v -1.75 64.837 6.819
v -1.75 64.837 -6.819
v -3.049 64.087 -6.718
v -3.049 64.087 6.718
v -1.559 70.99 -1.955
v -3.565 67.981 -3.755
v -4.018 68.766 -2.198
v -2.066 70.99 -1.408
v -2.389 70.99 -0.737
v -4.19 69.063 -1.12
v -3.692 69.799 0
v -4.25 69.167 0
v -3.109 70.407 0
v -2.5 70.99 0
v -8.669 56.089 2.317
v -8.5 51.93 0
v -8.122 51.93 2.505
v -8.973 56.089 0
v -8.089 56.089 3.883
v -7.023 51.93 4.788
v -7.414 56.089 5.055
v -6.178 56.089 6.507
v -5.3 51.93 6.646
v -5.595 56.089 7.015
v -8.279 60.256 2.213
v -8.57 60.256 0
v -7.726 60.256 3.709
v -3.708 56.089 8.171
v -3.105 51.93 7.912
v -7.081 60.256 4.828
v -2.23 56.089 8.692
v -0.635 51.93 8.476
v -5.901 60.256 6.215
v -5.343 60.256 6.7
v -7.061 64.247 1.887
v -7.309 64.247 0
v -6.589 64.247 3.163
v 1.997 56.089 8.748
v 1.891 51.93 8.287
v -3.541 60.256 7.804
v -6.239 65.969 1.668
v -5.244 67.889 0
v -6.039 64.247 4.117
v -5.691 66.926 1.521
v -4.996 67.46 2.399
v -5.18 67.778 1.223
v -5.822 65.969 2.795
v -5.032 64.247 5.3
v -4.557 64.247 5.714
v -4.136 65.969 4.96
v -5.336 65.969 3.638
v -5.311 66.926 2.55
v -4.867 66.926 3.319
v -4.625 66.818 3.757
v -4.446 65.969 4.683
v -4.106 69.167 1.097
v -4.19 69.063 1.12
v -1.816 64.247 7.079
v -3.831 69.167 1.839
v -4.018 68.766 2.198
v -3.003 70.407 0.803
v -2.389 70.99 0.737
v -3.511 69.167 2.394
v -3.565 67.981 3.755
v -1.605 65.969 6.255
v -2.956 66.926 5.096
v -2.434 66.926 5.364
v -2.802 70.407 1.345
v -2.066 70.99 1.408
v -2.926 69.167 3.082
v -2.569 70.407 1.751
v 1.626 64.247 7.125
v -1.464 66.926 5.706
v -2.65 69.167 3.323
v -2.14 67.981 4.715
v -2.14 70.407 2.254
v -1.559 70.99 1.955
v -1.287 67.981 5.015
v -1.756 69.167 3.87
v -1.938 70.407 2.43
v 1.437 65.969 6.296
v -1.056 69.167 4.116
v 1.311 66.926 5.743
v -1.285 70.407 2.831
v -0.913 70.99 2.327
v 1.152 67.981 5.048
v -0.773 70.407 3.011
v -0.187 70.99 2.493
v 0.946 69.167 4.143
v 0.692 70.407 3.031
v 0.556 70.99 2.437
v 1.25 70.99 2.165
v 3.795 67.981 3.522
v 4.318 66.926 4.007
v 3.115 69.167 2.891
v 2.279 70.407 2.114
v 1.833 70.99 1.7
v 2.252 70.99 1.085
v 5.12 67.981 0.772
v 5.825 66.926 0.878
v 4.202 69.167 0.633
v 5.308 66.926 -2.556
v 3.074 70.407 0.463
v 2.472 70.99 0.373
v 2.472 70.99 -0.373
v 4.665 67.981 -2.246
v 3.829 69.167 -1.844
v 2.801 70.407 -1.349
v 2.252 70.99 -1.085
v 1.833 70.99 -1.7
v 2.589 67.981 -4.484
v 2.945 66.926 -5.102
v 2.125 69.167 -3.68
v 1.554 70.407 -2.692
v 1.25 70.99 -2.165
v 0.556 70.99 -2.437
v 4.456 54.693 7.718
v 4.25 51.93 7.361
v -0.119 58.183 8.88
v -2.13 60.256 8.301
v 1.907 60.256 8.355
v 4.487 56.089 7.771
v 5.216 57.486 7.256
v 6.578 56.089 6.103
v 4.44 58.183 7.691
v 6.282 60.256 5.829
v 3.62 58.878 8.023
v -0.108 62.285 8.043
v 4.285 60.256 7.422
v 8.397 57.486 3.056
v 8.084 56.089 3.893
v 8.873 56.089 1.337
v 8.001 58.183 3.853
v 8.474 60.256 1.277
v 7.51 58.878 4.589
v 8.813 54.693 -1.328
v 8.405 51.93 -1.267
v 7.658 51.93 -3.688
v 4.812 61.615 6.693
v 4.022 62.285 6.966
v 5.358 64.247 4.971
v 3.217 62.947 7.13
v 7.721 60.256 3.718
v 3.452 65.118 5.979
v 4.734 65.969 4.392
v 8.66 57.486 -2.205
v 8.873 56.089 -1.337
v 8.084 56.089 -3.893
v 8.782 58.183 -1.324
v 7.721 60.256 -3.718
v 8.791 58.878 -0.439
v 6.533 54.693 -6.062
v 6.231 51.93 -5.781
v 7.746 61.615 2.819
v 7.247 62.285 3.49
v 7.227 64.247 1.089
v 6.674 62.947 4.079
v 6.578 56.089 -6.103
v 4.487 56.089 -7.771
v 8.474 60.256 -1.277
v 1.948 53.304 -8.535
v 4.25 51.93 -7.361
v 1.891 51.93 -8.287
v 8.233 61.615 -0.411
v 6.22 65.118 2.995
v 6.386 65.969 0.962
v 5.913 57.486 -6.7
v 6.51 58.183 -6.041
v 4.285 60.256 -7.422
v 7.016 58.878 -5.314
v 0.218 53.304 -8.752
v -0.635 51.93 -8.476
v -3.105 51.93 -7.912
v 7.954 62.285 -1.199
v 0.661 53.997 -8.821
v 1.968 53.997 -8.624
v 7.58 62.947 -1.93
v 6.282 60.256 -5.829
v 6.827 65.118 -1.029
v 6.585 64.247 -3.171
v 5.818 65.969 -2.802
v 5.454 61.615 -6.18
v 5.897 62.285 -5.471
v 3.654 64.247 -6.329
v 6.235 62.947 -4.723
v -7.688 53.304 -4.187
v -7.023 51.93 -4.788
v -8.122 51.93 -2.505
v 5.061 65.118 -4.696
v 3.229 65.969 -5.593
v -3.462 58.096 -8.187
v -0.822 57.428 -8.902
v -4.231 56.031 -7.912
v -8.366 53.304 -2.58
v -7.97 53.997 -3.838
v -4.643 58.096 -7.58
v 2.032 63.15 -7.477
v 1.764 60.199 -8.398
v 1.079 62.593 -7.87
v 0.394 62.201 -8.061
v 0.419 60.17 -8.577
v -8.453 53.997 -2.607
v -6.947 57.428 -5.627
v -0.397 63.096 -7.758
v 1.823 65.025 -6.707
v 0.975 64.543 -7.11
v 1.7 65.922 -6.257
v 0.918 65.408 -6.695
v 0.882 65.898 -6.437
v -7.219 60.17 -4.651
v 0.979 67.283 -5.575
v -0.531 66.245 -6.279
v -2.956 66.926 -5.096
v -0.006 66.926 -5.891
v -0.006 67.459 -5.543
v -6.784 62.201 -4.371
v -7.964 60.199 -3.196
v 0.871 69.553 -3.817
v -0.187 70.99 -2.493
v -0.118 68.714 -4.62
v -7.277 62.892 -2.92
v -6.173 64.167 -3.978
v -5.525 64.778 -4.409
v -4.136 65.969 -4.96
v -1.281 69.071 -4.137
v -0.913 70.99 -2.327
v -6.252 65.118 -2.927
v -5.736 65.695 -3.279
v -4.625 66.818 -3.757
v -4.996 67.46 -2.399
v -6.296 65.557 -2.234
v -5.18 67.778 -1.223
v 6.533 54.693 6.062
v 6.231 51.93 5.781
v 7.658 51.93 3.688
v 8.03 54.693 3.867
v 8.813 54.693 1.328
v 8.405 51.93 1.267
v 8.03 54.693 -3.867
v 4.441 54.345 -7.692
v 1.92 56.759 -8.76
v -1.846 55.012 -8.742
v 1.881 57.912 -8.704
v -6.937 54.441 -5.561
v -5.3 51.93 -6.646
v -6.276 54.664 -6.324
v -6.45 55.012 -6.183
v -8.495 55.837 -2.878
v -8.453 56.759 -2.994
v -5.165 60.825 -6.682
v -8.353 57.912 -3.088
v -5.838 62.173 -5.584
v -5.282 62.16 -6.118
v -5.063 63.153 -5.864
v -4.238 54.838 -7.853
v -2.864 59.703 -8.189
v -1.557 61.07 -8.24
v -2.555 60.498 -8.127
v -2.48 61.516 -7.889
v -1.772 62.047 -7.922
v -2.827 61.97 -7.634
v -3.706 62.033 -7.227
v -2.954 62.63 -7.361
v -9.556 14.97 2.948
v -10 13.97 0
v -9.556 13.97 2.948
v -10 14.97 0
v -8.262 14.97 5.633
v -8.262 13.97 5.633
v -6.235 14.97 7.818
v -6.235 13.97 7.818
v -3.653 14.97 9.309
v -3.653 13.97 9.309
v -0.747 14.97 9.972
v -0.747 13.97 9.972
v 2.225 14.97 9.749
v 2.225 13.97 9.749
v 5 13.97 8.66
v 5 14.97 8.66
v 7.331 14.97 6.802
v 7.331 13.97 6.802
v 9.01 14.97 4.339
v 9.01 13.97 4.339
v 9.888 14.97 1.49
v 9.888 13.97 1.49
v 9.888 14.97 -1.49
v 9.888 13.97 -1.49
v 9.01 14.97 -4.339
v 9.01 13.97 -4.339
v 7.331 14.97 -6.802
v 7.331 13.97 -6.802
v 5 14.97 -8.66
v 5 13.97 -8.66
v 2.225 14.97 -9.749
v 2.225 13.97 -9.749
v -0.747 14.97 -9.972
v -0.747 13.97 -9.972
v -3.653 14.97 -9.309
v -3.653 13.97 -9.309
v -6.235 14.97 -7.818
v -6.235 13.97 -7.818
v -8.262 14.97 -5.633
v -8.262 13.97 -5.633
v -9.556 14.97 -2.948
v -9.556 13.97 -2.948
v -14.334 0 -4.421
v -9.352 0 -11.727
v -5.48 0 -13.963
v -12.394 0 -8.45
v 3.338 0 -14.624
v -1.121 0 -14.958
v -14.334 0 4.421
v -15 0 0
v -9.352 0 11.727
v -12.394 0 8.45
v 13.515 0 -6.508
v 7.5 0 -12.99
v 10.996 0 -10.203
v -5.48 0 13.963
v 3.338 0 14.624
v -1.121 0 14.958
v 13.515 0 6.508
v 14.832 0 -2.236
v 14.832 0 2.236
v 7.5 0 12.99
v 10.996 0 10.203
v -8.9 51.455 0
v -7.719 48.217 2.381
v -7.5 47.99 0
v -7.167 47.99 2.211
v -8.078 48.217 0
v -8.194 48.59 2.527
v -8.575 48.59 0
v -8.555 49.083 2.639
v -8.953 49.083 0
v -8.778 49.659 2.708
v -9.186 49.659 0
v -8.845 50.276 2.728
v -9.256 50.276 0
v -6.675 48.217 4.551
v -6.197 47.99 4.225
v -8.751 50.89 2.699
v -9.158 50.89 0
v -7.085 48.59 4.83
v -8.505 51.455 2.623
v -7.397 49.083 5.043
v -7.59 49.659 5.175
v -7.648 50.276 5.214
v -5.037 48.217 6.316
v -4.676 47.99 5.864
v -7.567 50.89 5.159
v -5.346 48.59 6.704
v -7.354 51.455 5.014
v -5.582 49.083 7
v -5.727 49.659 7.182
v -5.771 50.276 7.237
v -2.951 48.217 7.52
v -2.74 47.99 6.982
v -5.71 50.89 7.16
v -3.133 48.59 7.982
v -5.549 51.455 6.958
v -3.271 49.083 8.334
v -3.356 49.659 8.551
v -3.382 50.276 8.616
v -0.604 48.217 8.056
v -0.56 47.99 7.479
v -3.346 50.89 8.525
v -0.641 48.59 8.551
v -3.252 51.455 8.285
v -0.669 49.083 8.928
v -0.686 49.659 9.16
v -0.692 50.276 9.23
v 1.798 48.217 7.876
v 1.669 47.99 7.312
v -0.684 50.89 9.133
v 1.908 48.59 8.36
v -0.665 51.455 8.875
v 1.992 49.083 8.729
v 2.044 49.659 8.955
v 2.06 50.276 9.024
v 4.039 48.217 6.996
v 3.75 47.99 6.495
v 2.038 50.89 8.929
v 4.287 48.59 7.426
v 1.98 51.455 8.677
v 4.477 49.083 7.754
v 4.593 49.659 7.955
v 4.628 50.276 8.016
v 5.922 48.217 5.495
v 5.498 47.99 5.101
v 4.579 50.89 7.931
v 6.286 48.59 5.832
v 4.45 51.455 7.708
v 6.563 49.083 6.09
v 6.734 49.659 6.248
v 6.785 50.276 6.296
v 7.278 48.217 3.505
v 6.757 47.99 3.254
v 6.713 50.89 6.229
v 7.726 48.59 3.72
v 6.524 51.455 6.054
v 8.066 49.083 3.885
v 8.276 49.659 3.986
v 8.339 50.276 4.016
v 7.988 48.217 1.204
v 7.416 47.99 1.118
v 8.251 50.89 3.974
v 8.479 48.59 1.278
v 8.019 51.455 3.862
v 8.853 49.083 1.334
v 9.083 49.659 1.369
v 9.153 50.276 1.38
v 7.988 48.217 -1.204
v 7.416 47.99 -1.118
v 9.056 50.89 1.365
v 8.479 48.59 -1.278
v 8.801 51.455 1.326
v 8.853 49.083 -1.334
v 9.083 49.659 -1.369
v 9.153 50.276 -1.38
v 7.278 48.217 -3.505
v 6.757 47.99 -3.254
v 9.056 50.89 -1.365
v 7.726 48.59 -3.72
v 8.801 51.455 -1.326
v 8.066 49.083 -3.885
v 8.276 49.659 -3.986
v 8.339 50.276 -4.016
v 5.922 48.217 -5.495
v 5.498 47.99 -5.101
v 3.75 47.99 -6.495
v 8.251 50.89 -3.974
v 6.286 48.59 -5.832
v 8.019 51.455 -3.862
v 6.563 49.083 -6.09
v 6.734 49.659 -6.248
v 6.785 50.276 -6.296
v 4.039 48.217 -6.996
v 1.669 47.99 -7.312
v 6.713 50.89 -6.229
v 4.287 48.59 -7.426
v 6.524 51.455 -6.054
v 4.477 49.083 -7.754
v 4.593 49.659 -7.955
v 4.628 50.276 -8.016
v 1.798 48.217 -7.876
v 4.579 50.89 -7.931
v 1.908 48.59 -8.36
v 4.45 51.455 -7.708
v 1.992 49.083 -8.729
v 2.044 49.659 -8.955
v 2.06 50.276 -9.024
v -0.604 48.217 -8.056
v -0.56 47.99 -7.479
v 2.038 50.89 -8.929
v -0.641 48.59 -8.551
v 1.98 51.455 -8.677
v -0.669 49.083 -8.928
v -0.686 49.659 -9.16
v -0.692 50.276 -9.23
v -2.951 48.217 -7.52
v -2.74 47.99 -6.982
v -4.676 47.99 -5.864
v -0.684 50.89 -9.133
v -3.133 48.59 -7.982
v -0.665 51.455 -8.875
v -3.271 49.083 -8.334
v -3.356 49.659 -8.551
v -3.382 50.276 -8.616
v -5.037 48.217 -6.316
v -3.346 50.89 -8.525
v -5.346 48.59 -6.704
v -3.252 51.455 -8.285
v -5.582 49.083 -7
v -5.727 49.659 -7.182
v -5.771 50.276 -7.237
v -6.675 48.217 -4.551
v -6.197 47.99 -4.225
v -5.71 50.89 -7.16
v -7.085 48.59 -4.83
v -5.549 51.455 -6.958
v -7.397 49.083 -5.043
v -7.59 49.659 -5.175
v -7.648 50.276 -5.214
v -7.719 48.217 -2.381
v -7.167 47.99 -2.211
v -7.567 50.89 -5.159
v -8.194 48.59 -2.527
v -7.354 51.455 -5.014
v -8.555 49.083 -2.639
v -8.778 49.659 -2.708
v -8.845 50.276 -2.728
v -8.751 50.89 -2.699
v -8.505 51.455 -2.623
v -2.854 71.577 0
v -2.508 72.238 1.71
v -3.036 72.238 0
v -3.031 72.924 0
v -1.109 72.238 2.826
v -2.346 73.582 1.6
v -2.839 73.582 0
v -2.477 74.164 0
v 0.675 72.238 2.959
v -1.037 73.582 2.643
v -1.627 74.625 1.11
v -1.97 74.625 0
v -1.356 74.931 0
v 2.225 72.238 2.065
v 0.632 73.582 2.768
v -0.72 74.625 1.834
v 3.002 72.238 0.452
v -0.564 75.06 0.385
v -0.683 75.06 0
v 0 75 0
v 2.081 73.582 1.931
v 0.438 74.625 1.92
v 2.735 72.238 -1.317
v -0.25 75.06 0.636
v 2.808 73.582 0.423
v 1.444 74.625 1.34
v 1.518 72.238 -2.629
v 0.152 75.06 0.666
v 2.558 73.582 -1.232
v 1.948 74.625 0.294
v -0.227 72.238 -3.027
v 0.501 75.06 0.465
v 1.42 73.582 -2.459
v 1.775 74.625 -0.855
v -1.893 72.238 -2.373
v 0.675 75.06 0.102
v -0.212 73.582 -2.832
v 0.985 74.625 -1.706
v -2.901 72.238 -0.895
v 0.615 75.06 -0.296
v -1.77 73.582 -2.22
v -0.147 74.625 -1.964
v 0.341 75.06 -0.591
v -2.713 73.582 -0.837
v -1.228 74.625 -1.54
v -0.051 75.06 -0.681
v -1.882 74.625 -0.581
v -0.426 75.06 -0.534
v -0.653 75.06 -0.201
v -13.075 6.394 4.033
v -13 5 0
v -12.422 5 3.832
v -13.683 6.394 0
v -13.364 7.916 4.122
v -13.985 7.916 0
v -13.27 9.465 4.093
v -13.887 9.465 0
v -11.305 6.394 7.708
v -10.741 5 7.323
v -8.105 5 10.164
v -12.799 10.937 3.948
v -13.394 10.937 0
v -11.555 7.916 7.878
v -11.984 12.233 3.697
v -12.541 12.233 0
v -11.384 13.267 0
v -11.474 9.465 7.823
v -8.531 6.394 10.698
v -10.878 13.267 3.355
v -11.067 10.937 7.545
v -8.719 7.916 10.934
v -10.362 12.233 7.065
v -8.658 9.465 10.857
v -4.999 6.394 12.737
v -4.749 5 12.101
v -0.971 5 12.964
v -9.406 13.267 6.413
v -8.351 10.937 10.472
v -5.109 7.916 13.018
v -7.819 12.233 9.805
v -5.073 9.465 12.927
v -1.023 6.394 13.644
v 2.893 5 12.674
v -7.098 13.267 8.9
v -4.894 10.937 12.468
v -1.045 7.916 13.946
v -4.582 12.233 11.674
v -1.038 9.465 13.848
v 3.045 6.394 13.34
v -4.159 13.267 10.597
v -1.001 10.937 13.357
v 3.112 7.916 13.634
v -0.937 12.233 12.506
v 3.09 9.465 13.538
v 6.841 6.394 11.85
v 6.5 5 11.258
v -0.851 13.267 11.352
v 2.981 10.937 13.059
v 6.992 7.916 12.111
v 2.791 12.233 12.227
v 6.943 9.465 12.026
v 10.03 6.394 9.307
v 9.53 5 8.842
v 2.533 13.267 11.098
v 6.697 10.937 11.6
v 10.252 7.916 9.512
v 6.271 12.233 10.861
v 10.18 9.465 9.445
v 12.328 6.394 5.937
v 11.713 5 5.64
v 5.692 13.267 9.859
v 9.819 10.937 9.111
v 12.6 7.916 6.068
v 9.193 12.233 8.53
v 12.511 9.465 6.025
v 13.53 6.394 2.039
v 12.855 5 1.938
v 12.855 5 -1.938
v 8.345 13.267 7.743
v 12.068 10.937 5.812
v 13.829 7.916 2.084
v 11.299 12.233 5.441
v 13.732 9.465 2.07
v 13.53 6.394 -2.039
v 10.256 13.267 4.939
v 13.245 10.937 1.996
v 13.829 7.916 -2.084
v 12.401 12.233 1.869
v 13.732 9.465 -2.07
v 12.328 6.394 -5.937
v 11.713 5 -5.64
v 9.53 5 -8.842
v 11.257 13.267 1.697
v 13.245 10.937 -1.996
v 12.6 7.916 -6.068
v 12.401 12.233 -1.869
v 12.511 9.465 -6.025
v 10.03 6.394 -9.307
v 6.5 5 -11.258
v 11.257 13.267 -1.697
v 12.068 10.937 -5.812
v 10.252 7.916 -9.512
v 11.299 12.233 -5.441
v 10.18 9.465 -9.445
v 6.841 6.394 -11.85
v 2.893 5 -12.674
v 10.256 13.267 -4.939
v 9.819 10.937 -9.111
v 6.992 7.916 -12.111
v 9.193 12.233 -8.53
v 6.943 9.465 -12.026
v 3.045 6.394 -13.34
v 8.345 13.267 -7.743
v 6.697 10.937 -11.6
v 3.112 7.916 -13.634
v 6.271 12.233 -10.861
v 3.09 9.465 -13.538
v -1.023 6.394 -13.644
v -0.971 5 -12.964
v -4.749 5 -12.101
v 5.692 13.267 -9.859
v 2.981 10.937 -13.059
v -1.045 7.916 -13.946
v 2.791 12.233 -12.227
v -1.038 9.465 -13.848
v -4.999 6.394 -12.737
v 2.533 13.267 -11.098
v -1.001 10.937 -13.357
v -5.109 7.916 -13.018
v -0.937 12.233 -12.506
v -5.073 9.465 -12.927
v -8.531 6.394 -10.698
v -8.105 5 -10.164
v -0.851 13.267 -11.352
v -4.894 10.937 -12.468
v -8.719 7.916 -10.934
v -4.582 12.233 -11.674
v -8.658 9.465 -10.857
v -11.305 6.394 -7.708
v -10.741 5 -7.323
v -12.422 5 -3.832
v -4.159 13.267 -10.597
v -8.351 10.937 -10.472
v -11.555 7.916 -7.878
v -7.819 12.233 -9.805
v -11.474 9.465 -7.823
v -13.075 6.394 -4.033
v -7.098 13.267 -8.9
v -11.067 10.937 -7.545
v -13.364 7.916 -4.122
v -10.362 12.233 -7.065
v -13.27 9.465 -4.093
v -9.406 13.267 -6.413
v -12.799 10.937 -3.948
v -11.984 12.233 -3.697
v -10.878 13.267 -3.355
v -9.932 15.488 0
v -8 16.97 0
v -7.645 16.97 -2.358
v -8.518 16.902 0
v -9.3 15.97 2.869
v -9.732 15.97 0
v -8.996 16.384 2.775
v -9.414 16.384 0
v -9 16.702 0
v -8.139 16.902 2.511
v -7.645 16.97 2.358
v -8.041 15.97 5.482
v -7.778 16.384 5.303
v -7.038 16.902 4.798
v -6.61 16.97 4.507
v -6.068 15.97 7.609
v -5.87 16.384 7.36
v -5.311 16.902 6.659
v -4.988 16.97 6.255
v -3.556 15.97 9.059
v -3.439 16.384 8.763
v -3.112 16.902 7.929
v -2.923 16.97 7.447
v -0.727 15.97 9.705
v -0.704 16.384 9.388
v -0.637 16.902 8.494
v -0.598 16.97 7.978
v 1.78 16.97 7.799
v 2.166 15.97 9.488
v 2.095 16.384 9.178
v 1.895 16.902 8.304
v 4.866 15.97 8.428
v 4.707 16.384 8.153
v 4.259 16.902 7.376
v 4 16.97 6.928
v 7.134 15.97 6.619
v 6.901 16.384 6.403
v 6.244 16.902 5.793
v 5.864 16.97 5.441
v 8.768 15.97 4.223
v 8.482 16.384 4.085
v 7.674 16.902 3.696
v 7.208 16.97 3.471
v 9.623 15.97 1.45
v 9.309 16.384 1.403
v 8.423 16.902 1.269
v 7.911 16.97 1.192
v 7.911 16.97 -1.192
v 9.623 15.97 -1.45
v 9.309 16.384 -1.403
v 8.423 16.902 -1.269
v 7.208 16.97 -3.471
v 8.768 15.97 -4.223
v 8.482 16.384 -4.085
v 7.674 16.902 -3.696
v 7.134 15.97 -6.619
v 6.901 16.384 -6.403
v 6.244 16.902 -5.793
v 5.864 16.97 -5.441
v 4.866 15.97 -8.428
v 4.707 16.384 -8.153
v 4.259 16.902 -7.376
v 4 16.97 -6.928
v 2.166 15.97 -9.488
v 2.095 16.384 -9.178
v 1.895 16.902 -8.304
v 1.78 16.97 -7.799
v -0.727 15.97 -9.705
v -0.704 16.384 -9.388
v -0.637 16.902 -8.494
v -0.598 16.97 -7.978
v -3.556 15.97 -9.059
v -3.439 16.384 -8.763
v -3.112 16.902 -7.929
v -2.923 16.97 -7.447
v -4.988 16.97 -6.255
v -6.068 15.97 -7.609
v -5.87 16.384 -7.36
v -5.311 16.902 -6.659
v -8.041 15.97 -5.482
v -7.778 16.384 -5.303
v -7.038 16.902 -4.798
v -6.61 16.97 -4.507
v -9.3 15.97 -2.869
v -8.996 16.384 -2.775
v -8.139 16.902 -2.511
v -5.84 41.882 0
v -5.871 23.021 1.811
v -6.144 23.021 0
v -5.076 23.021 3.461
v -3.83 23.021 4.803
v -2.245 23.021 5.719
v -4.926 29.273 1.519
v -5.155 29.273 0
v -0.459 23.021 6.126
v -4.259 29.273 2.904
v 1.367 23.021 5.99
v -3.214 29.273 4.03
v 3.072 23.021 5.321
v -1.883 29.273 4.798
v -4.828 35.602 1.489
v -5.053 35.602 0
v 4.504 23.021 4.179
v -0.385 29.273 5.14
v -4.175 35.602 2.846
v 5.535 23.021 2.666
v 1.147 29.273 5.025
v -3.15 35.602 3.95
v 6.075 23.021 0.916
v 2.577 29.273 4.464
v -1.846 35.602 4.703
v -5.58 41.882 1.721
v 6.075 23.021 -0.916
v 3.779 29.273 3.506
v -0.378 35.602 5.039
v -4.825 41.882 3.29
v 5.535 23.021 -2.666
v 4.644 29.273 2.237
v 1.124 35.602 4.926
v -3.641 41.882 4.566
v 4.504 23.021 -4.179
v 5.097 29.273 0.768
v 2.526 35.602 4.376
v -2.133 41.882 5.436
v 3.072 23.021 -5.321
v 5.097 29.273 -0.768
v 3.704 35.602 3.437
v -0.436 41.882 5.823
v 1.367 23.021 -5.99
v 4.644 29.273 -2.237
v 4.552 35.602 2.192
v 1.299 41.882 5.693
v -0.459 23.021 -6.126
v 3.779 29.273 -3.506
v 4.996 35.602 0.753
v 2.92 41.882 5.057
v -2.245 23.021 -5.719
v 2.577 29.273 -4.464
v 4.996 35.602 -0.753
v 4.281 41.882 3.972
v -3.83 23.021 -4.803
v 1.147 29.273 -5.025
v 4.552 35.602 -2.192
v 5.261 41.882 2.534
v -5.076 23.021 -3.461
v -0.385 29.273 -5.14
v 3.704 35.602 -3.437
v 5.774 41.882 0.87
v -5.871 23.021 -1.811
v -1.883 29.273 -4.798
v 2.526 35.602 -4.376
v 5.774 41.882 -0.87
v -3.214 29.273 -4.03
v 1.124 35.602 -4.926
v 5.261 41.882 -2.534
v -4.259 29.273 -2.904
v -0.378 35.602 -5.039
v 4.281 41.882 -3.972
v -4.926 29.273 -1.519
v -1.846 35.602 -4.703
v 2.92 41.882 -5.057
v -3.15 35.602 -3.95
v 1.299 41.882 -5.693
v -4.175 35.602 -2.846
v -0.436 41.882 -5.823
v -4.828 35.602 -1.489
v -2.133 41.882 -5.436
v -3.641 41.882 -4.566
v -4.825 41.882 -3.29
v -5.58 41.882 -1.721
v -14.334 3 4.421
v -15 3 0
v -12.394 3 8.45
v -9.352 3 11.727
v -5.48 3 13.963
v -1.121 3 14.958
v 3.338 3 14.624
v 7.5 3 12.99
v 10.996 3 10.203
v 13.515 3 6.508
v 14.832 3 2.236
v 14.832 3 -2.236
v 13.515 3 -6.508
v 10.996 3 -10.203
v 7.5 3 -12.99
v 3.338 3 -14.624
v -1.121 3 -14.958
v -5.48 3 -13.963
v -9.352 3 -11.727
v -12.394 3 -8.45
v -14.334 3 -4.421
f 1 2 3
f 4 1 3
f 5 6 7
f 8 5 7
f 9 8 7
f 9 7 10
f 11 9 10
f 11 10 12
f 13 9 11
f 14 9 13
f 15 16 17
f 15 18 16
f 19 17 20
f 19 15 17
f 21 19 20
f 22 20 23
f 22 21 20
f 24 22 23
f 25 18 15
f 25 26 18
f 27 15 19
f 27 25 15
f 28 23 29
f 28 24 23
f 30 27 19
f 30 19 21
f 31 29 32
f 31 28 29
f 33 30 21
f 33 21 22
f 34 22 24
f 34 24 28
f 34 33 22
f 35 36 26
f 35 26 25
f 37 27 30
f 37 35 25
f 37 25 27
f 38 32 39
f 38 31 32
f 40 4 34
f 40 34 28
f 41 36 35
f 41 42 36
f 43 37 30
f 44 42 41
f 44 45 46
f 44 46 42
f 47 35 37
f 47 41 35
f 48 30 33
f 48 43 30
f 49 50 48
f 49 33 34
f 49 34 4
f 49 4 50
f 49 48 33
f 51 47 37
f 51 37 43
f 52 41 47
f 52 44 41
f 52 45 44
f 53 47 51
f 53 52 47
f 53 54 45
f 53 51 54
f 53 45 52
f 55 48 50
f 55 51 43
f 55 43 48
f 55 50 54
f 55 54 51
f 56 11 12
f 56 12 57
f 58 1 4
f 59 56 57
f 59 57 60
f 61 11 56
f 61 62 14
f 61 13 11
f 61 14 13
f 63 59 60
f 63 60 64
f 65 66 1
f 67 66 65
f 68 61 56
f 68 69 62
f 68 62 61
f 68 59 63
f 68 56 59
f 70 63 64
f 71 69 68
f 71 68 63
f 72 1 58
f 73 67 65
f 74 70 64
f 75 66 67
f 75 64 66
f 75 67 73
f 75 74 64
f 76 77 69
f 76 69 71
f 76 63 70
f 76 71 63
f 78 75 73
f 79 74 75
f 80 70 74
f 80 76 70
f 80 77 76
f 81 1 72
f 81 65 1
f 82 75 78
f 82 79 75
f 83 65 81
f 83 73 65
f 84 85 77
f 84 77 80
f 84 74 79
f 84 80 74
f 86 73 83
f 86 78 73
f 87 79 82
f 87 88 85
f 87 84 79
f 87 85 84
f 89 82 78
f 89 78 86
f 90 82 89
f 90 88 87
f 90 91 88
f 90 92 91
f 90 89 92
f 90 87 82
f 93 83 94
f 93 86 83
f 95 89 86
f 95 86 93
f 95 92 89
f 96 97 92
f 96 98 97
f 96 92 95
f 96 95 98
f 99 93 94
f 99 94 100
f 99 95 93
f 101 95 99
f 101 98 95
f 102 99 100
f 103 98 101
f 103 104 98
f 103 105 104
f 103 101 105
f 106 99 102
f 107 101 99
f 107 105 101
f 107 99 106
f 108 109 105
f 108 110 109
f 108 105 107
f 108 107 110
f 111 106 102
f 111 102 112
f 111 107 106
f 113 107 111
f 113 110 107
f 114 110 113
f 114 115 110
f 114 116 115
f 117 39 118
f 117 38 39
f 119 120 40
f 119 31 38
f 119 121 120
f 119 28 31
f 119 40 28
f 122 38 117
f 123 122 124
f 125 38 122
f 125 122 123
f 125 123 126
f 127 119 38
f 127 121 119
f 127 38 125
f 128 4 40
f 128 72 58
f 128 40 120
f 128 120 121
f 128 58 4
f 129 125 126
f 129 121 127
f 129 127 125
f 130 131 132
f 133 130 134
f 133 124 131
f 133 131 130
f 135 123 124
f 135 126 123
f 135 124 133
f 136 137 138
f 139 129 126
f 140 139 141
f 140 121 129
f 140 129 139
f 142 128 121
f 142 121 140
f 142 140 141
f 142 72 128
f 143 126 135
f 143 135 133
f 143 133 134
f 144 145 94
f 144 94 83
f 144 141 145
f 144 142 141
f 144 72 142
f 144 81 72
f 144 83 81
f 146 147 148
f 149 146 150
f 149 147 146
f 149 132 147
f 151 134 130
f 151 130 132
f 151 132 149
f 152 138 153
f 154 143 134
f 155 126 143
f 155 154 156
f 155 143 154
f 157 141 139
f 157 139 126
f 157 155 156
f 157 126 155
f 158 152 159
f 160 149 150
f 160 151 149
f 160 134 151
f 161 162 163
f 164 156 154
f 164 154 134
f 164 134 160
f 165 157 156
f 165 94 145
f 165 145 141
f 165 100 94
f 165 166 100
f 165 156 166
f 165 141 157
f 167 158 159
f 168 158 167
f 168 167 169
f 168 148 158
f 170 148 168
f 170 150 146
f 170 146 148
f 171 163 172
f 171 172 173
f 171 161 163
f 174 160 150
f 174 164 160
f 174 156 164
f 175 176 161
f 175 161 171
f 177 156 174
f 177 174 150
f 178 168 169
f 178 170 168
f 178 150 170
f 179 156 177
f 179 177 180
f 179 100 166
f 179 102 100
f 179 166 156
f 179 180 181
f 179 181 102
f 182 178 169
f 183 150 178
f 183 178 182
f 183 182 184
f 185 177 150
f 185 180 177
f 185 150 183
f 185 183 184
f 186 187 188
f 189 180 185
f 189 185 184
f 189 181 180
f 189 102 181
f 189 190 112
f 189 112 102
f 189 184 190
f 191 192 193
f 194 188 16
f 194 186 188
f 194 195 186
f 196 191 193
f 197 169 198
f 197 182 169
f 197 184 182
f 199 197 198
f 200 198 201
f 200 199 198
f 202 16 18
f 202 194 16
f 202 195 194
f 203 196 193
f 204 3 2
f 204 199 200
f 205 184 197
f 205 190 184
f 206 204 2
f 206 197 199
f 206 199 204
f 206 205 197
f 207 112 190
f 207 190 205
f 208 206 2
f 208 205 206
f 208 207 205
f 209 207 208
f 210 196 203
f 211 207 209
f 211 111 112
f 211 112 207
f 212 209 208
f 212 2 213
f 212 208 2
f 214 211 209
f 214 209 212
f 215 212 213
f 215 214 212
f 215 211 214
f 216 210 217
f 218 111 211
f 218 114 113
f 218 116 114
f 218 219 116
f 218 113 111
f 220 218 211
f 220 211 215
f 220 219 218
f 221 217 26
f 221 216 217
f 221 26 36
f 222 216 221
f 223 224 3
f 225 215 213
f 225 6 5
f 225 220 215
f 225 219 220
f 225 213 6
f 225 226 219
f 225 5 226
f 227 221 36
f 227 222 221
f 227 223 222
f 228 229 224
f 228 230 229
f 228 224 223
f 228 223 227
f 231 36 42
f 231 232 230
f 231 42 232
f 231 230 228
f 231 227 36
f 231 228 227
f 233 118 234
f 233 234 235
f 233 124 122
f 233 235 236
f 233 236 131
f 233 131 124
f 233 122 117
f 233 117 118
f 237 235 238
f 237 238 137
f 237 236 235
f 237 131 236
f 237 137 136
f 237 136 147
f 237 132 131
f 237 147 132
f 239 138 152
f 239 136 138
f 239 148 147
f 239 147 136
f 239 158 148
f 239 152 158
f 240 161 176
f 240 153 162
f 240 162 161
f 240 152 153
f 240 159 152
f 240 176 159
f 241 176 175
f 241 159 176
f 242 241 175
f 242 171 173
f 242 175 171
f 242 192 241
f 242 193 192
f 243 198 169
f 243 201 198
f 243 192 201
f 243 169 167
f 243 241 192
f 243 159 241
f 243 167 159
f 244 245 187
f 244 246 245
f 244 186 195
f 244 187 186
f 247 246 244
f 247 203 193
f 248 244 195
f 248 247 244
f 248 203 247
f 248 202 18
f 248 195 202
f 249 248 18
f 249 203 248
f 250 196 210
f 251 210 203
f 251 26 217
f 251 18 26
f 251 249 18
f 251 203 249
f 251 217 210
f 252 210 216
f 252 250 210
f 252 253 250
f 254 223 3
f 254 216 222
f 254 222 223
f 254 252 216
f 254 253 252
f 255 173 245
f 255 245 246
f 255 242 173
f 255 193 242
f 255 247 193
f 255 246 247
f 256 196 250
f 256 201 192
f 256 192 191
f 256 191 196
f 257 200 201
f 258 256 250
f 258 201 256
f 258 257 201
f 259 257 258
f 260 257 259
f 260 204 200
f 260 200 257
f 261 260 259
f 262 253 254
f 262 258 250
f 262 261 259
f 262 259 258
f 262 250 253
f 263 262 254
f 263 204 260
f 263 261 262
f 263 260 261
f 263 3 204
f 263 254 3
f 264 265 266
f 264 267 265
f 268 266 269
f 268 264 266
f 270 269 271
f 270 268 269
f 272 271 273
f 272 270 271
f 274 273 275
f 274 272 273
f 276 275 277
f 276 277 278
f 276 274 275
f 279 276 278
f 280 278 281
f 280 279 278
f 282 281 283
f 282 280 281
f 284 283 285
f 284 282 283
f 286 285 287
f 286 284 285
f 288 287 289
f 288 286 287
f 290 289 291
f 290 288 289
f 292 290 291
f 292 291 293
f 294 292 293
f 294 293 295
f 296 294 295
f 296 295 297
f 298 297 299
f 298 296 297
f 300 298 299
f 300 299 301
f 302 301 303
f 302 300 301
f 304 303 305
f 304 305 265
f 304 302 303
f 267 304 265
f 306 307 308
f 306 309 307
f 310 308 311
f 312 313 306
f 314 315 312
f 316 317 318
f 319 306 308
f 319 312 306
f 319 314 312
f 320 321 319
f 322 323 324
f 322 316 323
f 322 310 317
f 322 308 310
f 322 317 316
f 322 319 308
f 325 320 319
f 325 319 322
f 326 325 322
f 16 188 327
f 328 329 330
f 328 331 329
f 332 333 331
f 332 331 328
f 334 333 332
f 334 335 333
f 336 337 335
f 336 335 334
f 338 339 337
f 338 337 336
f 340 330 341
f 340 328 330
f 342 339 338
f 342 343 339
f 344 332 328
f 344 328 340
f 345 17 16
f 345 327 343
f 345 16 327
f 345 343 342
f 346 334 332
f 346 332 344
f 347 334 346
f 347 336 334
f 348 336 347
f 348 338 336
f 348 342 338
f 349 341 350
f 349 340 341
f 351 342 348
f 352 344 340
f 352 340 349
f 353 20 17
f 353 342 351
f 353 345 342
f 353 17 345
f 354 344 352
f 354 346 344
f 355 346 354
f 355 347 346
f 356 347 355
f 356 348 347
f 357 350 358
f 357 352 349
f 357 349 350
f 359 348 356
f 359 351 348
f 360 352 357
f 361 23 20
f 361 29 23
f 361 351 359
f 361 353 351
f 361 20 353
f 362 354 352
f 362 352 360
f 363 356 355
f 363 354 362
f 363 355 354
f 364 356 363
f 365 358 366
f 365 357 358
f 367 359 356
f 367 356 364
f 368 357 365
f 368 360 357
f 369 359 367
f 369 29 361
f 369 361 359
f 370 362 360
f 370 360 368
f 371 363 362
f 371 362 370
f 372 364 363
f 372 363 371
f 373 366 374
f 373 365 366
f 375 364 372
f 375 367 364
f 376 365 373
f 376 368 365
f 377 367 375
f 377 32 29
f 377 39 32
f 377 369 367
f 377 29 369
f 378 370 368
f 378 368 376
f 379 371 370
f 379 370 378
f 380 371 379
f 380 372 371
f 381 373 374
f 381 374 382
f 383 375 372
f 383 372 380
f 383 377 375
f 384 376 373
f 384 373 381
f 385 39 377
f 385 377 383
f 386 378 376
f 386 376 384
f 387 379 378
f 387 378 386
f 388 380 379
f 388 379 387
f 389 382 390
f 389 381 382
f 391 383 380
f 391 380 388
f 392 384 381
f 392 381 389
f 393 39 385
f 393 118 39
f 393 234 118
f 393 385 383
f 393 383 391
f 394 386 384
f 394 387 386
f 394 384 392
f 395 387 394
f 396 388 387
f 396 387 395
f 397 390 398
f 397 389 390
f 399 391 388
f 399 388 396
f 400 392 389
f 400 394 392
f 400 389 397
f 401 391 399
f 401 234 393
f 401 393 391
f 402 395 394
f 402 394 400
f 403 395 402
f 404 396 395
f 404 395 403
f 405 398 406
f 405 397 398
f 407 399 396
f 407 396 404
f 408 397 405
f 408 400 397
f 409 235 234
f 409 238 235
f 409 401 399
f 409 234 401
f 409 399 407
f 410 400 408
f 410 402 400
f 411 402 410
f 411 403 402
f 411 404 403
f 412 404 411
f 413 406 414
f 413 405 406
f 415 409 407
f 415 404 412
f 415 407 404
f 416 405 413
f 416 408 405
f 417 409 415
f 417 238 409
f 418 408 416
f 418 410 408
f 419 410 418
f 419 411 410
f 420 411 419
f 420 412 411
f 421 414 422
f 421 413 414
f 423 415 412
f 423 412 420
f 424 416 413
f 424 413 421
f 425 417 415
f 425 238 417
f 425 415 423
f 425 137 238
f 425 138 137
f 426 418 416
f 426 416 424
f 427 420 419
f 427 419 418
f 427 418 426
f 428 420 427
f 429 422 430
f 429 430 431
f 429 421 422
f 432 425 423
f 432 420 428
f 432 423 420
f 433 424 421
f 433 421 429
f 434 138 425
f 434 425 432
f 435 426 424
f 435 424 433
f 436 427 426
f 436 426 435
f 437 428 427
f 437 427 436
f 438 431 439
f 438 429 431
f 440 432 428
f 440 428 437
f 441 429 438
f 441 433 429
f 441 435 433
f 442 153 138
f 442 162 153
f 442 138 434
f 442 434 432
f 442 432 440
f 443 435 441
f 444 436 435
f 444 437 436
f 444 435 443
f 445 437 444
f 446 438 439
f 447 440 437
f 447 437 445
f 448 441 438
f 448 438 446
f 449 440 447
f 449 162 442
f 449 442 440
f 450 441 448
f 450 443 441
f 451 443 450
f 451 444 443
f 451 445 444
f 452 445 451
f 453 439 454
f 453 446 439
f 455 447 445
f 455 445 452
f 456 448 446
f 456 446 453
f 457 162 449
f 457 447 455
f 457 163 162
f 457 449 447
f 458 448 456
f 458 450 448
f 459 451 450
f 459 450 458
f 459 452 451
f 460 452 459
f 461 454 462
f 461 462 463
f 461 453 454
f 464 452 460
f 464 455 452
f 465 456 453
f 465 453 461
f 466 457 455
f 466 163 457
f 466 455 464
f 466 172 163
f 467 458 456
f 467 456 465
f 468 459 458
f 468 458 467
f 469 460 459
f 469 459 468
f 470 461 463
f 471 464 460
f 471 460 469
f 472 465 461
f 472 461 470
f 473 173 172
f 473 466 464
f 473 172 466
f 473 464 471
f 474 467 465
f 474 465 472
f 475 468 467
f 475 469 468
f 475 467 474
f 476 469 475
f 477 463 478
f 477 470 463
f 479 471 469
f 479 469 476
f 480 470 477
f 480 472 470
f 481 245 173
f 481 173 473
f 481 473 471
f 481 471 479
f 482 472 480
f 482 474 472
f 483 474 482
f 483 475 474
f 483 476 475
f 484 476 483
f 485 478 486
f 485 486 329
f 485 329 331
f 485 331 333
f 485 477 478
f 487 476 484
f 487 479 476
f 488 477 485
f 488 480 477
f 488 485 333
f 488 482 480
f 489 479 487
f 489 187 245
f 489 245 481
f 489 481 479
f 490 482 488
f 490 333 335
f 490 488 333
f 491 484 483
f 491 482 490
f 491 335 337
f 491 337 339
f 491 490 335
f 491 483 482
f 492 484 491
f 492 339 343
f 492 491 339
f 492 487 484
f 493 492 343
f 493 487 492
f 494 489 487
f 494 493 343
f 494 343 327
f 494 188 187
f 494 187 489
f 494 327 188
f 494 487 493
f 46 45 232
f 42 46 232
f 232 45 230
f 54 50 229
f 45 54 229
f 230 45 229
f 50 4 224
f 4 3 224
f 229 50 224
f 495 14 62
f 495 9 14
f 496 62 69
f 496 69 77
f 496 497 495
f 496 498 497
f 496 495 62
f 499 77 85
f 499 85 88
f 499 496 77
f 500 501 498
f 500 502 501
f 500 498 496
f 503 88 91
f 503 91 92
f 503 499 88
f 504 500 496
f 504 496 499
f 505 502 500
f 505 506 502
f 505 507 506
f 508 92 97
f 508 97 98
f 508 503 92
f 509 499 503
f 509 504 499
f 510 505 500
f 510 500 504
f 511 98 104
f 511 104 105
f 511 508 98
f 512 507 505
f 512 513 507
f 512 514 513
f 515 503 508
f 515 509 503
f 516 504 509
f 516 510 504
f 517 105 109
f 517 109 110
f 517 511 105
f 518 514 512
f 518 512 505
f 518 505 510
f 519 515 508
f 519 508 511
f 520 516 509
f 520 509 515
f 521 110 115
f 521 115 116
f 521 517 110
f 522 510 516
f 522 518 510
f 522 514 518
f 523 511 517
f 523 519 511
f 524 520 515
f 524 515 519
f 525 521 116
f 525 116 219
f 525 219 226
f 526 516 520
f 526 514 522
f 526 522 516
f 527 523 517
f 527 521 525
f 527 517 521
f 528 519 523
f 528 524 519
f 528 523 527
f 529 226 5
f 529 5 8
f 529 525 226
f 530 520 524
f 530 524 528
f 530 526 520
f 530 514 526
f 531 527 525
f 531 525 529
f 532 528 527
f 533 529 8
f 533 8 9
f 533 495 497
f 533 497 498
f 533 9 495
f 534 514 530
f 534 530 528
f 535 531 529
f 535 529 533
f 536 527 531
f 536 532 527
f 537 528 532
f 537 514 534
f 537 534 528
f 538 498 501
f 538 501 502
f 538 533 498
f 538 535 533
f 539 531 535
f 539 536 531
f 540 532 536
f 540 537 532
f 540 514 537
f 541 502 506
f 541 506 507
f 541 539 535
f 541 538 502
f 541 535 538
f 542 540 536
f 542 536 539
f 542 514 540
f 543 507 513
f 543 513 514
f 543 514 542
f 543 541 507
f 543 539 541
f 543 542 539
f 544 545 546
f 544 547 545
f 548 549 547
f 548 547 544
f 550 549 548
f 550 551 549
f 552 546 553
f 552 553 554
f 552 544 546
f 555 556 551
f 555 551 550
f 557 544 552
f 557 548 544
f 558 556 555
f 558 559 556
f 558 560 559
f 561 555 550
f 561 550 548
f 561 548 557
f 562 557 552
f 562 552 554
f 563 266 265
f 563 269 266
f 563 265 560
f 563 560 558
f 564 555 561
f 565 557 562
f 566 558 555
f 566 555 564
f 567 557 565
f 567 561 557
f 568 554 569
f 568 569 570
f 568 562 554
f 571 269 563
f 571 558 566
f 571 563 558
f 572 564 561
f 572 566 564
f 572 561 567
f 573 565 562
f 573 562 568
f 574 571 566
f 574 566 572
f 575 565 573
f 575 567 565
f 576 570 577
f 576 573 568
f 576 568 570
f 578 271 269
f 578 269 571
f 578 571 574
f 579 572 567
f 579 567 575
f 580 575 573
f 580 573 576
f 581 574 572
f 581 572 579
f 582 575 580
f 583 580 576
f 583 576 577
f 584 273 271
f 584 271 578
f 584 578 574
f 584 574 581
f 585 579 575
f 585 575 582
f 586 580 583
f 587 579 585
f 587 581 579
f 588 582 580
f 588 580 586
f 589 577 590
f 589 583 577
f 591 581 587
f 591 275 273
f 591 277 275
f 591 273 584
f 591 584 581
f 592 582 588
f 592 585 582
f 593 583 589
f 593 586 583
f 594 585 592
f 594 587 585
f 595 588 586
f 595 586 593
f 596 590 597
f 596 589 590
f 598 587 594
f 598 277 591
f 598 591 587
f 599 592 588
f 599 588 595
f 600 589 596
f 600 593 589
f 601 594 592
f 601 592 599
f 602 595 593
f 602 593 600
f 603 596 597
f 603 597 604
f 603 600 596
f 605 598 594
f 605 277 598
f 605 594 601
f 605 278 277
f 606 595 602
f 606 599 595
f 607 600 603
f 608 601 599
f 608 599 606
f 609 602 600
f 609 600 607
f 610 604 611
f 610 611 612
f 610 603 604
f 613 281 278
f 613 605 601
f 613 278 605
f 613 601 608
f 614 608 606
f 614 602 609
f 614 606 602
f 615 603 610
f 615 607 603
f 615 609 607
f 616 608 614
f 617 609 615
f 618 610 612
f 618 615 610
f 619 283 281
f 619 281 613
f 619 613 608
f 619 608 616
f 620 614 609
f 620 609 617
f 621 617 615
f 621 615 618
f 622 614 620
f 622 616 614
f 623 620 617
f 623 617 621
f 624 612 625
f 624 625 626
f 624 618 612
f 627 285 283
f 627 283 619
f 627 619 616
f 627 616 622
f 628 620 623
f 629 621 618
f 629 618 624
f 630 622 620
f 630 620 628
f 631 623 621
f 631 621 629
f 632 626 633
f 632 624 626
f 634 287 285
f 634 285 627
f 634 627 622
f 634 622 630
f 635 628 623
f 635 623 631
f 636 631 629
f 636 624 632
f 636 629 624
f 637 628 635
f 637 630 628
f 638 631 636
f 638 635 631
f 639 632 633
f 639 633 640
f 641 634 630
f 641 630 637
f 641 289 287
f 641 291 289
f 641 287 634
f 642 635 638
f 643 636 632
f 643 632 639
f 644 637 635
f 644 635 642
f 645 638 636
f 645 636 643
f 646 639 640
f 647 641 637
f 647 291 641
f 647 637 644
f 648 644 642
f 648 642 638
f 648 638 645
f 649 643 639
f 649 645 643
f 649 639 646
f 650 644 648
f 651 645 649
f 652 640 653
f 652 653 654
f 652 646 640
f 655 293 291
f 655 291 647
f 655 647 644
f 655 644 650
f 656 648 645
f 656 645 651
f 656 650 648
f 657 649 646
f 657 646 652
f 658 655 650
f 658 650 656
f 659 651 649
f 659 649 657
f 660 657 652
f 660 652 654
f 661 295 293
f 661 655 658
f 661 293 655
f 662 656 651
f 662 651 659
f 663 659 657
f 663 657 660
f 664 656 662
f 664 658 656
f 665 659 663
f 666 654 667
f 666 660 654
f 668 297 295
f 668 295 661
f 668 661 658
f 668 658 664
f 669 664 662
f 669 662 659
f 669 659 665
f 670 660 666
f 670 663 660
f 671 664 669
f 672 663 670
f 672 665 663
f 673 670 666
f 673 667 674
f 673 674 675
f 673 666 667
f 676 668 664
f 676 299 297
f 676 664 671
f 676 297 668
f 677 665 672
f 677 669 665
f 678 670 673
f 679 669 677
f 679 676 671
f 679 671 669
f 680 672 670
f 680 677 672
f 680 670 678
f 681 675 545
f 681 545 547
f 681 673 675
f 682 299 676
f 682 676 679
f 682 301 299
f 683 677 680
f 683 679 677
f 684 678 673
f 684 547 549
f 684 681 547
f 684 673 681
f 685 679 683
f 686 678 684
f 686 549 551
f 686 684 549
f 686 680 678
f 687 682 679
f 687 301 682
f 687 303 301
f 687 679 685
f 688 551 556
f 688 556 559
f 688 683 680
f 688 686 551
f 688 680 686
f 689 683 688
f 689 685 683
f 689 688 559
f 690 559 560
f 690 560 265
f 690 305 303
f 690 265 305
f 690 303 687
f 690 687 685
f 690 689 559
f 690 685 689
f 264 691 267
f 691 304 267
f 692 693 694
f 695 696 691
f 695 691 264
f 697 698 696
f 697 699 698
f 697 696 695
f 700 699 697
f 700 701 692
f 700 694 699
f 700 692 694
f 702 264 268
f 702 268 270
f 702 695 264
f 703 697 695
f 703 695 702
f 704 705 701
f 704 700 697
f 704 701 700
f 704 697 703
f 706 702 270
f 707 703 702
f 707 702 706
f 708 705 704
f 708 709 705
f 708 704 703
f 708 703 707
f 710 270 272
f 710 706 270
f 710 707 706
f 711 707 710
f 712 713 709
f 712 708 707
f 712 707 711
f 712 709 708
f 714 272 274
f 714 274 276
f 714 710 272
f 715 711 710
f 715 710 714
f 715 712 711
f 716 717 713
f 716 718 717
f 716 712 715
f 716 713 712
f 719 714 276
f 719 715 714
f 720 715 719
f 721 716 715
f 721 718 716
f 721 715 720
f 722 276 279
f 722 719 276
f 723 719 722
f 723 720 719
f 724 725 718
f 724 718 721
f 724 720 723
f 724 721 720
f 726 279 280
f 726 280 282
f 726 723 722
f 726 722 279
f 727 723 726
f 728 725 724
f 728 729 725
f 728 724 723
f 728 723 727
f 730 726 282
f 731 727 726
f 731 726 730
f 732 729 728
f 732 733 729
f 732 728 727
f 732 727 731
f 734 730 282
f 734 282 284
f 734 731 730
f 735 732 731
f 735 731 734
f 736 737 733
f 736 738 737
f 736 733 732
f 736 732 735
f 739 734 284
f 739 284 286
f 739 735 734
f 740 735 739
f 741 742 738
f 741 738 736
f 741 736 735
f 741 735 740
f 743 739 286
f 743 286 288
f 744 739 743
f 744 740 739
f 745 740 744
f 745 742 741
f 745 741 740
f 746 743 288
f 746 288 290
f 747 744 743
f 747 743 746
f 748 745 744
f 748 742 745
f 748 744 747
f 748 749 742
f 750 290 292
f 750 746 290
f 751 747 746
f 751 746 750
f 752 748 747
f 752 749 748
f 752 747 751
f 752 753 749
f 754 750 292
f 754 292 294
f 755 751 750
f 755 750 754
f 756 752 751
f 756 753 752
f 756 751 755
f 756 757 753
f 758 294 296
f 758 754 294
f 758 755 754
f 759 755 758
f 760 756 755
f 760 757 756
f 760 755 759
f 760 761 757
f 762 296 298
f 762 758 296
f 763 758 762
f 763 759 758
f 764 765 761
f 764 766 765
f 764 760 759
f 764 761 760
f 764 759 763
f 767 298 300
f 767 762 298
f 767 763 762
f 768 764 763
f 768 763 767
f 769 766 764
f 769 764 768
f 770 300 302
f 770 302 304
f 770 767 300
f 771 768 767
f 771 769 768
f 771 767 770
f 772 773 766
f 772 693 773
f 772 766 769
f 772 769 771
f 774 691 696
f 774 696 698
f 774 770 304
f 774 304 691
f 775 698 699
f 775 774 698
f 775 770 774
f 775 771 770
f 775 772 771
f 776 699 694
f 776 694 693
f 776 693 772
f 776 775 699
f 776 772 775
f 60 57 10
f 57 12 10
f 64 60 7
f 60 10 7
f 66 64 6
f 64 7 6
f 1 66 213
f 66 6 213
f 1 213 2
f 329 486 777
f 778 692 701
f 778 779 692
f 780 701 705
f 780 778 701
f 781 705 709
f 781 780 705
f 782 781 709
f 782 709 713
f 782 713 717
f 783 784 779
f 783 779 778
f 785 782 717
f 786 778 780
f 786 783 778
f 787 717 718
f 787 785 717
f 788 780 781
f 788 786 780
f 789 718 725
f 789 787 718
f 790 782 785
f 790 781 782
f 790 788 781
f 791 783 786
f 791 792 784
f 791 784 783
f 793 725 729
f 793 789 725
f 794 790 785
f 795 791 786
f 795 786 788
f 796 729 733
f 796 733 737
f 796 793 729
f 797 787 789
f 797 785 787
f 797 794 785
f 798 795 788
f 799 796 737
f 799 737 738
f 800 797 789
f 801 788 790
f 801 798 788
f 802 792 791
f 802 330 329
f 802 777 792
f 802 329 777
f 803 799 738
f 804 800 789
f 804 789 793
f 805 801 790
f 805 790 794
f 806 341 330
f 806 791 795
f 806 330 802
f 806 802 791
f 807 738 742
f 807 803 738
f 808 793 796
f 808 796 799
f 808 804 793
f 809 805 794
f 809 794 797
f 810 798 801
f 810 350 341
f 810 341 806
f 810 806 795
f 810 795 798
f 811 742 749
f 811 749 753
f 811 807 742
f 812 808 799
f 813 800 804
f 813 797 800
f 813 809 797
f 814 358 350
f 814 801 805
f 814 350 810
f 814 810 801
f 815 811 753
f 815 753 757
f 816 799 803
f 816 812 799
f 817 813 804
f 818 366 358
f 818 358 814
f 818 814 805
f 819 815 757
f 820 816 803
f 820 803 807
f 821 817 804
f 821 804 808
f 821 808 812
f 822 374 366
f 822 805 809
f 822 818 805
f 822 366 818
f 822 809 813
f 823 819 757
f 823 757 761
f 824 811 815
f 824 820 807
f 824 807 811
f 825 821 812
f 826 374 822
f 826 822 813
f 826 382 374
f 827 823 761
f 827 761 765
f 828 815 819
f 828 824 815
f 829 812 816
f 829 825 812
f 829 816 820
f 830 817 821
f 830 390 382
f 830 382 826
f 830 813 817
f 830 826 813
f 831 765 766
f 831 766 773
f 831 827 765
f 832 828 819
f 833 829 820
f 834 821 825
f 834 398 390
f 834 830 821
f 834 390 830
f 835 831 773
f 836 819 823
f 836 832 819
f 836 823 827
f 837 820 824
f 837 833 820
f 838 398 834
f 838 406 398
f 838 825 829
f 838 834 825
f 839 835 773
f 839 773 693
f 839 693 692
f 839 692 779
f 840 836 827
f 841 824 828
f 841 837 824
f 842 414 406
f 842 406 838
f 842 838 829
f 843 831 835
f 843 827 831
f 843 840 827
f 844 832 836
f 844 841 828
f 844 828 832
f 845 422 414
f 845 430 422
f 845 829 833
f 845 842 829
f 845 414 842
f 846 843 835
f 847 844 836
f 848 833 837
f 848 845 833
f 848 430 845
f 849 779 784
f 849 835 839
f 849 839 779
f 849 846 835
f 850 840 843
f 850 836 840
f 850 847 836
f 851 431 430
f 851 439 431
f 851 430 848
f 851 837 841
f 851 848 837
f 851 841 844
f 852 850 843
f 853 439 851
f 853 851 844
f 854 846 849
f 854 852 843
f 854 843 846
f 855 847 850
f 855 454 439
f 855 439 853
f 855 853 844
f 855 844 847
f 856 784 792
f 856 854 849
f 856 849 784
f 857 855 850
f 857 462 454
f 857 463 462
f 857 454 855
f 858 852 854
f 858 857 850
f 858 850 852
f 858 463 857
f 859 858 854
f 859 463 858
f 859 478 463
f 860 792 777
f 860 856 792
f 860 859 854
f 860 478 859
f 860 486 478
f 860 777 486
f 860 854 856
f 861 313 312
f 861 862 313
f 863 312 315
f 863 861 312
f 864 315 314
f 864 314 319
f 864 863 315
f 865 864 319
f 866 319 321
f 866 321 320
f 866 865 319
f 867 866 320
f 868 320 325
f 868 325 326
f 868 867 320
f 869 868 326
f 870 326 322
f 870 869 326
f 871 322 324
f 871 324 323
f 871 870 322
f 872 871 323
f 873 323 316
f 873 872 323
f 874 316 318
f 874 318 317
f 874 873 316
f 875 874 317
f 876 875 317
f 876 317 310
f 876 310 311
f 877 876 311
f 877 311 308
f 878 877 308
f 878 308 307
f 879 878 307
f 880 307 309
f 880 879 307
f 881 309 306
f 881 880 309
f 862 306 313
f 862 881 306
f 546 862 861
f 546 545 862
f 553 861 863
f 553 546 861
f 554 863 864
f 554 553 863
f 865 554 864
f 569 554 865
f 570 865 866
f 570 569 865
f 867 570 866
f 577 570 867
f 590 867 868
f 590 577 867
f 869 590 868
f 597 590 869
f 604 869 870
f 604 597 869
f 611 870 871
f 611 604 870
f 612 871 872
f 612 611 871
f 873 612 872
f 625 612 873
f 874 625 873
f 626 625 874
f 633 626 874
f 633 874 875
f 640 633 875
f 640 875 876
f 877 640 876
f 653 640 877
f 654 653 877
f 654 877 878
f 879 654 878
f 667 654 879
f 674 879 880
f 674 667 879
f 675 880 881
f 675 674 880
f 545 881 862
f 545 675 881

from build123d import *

# Parameters (mm, degrees)
CUT_EXTRUDE1_DEPTH      = 16
CUT_EXTRUDE1_DEPTH_BACK = 16


with BuildPart() as part:
    # Sketch1 → Revolve1 (revolve)
    with BuildSketch(Plane.XY):
        with BuildLine():
            Line((0, 0), (-15, 0))
            Line((-15, 0), (-15, 3))
            Line((-15, 3), (-13, 5))
            ThreePointArc((-13, 5), (-13.688325627, 10.216881481), (-10, 13.97))
            Line((-10, 13.97), (-10, 14.97))
            ThreePointArc((-10, 14.97), (-9.414213562, 16.384213562), (-8, 16.97))
            ThreePointArc((-8, 16.97), (-4.992249752, 32.435548835), (-7.5, 47.99))
            ThreePointArc((-7.5, 47.99), (-9.185787897, 49.659038605), (-8.5, 51.93))
            ThreePointArc((-8.5, 51.93), (-8.050914733, 62.26301618), (-2.5, 70.99))
            ThreePointArc((-2.5, 70.99), (-2.678187953, 73.885391492), (0, 75))
            Line((0, 75), (0, 70.99))
            Line((0, 70.99), (0, 51.93))
            Line((0, 51.93), (0, 47.99))
            Line((0, 47.99), (0, 16.97))
            Line((0, 16.97), (0, 14.97))
            Line((0, 14.97), (0, 13.97))
            Line((0, 13.97), (0, 5))
            Line((0, 5), (0, 3))
            Line((0, 3), (0, 0))
        make_face()
    revolve(axis=Axis((0, 0, 0), (0, 1, 0)))

    # Sketch2 → Cut-Extrude1 (cut, two sides)
    with BuildSketch(Plane.XY) as cut_extrude1_sk:
        Polygon((-4.249702272, 69.166839221), (-1.749702272, 64.836712202), (-3.048740377, 64.086712202), (-5.243895878, 67.888833061), (-5.823762224, 68.893191032), (-4.631125277, 69.887003162), align=None)
    extrude(amount=CUT_EXTRUDE1_DEPTH, mode=Mode.SUBTRACT)
    extrude(cut_extrude1_sk.sketch, amount=-CUT_EXTRUDE1_DEPTH_BACK, mode=Mode.SUBTRACT)


solid = part.part
